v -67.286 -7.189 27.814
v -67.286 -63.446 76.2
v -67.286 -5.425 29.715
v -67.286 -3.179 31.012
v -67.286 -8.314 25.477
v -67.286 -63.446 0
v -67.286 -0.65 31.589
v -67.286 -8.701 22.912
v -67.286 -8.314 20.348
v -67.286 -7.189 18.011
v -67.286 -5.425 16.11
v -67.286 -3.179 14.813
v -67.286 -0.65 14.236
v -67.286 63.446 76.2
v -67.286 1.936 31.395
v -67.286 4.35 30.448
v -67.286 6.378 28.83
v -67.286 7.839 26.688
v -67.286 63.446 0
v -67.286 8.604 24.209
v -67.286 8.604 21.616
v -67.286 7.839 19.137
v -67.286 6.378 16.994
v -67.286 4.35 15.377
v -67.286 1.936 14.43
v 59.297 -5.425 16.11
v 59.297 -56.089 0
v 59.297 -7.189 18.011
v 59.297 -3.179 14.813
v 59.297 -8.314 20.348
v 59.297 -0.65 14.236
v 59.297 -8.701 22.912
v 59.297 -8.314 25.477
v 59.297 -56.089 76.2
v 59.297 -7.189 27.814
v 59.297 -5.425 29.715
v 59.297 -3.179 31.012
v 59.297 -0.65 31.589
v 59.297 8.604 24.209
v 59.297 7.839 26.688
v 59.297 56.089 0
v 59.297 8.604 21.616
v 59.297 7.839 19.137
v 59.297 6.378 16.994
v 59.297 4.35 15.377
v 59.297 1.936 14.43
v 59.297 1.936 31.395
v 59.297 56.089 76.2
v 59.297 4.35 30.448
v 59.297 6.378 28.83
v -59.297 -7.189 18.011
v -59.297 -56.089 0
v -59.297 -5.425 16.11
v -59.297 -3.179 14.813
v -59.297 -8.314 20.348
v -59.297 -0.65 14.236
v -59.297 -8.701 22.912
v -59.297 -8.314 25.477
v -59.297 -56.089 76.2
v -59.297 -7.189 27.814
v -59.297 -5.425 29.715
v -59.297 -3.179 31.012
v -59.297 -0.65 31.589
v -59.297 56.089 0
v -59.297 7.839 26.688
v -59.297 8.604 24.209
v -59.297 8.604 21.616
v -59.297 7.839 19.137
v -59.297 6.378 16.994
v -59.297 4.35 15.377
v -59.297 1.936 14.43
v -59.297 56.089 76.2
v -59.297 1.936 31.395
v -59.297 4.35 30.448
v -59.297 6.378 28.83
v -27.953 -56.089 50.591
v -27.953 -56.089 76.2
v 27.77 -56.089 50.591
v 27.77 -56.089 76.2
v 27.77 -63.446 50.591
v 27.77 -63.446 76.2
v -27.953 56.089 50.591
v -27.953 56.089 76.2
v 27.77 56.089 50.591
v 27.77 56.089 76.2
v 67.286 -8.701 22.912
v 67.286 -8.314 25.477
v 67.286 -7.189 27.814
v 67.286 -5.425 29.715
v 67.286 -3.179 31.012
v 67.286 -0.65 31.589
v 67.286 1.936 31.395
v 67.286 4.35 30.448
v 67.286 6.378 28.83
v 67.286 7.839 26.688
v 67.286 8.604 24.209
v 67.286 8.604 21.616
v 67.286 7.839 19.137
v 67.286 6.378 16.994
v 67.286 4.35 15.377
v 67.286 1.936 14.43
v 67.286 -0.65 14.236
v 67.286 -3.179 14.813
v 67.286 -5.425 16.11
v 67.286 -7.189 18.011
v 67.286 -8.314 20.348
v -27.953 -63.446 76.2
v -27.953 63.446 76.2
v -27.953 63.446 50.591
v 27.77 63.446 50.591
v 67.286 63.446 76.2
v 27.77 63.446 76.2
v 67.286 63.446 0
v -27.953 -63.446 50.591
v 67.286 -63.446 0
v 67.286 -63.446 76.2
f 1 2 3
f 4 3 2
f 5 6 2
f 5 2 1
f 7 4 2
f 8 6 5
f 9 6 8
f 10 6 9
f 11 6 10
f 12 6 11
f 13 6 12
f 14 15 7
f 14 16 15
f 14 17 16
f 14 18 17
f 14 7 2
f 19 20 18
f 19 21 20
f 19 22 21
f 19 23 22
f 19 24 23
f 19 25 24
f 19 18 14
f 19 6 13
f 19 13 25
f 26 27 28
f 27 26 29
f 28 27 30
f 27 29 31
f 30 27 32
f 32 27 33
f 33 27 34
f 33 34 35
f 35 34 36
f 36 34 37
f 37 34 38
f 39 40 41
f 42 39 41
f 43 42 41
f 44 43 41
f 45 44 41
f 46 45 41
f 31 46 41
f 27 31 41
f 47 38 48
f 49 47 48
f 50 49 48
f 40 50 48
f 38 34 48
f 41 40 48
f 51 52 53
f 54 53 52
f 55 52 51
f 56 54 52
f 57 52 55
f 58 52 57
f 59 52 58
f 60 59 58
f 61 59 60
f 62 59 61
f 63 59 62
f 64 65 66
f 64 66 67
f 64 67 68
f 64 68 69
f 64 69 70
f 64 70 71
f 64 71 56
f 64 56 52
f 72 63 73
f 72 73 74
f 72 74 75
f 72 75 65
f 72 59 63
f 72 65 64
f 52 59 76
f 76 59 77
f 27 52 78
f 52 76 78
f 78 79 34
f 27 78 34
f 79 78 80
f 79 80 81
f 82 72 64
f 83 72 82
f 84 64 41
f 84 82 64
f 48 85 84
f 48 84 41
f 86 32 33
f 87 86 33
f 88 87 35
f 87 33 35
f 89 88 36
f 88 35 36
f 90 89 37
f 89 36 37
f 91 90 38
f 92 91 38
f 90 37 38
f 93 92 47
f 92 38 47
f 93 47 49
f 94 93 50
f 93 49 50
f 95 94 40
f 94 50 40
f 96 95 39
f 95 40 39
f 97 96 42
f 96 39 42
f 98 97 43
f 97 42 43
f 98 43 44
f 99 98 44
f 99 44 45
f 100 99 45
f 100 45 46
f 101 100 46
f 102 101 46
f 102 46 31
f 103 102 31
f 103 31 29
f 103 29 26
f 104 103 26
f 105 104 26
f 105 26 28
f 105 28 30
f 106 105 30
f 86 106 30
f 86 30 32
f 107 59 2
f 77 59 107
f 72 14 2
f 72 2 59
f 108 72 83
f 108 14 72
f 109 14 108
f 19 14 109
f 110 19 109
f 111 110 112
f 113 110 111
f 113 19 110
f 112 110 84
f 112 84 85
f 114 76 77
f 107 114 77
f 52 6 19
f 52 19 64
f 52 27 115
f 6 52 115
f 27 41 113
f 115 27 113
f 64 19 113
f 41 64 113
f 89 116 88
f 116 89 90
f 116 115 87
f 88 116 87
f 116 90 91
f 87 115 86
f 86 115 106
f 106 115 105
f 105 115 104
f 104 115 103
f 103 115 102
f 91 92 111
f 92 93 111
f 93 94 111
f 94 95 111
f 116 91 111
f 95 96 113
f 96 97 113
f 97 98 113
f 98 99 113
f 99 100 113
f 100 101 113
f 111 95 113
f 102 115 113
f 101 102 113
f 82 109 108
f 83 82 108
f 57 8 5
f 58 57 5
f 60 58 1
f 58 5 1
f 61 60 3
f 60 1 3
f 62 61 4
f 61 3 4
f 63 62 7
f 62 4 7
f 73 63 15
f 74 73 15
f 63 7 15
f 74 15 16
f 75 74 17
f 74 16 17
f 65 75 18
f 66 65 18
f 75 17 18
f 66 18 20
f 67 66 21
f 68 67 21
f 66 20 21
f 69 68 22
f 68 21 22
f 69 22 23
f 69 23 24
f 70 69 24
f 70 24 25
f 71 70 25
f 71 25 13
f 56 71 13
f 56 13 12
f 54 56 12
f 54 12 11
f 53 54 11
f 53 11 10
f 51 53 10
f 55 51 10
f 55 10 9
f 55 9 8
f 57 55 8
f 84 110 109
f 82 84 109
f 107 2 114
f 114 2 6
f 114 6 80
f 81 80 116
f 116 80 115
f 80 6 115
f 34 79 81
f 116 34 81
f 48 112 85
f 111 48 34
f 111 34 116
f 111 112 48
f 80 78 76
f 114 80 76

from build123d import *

# Parameters (mm, degrees)
F0_W     = 134.5710605383
F0_H     = 126.8914490938
F0_W_2   = 120.110668242
F0_H_2   = 106.3882932067
F1_DEPTH = 50.8
F2_R     = 8.7009101407
F3_DEPTH = 508
F4_DEPTH = 25.4
F6_W     = 55.7228904217
F6_H     = 25.6094848633
F7_DEPTH = 584.2
F5_W     = 118.594430387
F5_H     = 112.178966403
F8_DEPTH = 508


with BuildPart() as f1:
    # F0 (on Top) → F1 (new body)
    with BuildSketch(Plane.XY):
        Rectangle(F0_W, F0_H)
        Rectangle(F0_W_2, F0_H_2, mode=Mode.SUBTRACT)
        Rectangle(F0_W_2, F0_H_2)
    extrude(amount=F1_DEPTH)

    # F2 (on face) → F3 (cut)
    with BuildSketch(Plane(origin=(-67.2855302691, 0, 0), x_dir=(0, -1, 0), z_dir=(-1, 0, 0))):
        with Locations((0, 22.9123719037)):
            Circle(F2_R)
    extrude(amount=-F3_DEPTH, mode=Mode.SUBTRACT)

    # F4 (add): a face of the model
    f4_faces = [f1.faces().sort_by_distance(p)[0] for p in [
        (0, 0, 50.8),
    ]]
    extrude(f4_faces, amount=F4_DEPTH)

    # F6 (on face) → F7 (cut)
    with BuildSketch(Plane(origin=(0, 63.4457245469, 0), x_dir=(-1, 0, 0), z_dir=(0, 1, 0))):
        with Locations((0.0916505232, 63.3952575684)):
            Rectangle(F6_W, F6_H)
    extrude(amount=-F7_DEPTH, mode=Mode.SUBTRACT)

    # F5 (on face) → F8 (cut)
    with BuildSketch(Plane.XY.offset(76.2)):
        Rectangle(F5_W, F5_H)
    extrude(amount=-F8_DEPTH, mode=Mode.SUBTRACT)


solid = f1.part
